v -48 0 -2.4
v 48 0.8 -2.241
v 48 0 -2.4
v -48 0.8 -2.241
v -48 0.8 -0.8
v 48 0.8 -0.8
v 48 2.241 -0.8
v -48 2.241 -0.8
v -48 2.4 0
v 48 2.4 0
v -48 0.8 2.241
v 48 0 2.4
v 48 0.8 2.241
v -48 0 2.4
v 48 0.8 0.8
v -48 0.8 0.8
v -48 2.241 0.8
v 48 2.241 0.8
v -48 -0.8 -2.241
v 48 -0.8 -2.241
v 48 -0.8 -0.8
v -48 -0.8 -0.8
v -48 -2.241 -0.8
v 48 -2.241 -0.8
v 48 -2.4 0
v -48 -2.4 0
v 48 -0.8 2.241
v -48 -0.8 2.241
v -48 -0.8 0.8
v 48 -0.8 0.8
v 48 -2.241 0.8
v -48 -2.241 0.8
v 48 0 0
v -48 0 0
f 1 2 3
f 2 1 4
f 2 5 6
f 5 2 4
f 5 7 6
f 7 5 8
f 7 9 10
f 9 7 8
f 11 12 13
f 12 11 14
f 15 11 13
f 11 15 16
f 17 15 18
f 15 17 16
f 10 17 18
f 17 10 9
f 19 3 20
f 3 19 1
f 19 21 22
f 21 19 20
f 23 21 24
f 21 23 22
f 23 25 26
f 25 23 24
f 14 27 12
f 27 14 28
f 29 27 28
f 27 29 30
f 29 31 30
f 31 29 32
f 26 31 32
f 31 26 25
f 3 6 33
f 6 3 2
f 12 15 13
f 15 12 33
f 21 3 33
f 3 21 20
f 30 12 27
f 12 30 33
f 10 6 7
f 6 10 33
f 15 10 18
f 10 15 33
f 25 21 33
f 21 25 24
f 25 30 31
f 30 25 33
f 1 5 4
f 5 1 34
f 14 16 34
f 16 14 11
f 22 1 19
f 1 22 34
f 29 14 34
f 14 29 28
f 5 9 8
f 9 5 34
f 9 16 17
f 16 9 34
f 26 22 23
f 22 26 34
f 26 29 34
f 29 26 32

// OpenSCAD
// file: ../p/4-4edge.scad
use <../lib.scad>
$fa=1; $fs=0.2;
function ldraw_lib__4_4edge(realsolid=false) = [
// 0 Circle 1.0
// 0 Name: 4-4edge.dat
// 0 Author: James Jessiman
// 0 !LDRAW_ORG Primitive UPDATE 2017-01
// 0 !LICENSE Licensed under CC BY 2.0 and CC BY 4.0 : see CAreadme.txt
// 
// 0 BFC CERTIFY CCW
  [0,"BFC","CERTIFY"],
  [0,"BFC","CCW"],
// 
// 0 !HISTORY 1998-12-15 [PTadmin] Official Update 1998-10
// 0 !HISTORY 2005-12-28 [PTadmin] Official Update 2005-01
// 0 !HISTORY 2007-06-24 [PTadmin] Header formatted for Contributor Agreement
// 0 !HISTORY 2008-07-01 [PTadmin] Official Update 2008-01
// 0 !HISTORY 2017-01-15 [Steffen] BFCed
// 0 !HISTORY 2017-12-30 [PTadmin] Official Update 2017-01
// 
// 
// 2 24 1 0 0 0.9239 0 0.3827
  [2,24,1,0,0,0.9239,0,0.3827],
// 2 24 0.9239 0 0.3827 0.7071 0 0.7071
  [2,24,0.9239,0,0.3827,0.7071,0,0.7071],
// 2 24 0.7071 0 0.7071 0.3827 0 0.9239
  [2,24,0.7071,0,0.7071,0.3827,0,0.9239],
// 2 24 0.3827 0 0.9239 0 0 1
  [2,24,0.3827,0,0.9239,0,0,1],
// 2 24 0 0 1 -0.3827 0 0.9239
  [2,24,0,0,1,-0.3827,0,0.9239],
// 2 24 -0.3827 0 0.9239 -0.7071 0 0.7071
  [2,24,-0.3827,0,0.9239,-0.7071,0,0.7071],
// 2 24 -0.7071 0 0.7071 -0.9239 0 0.3827
  [2,24,-0.7071,0,0.7071,-0.9239,0,0.3827],
// 2 24 -0.9239 0 0.3827 -1 0 -0
  [2,24,-0.9239,0,0.3827,-1,0,-0],
// 2 24 -1 0 -0 -0.9239 0 -0.3827
  [2,24,-1,0,-0,-0.9239,0,-0.3827],
// 2 24 -0.9239 0 -0.3827 -0.7071 0 -0.7071
  [2,24,-0.9239,0,-0.3827,-0.7071,0,-0.7071],
// 2 24 -0.7071 0 -0.7071 -0.3827 0 -0.9239
  [2,24,-0.7071,0,-0.7071,-0.3827,0,-0.9239],
// 2 24 -0.3827 0 -0.9239 0 0 -1
  [2,24,-0.3827,0,-0.9239,0,0,-1],
// 2 24 0 0 -1 0.3827 0 -0.9239
  [2,24,0,0,-1,0.3827,0,-0.9239],
// 2 24 0.3827 0 -0.9239 0.7071 0 -0.7071
  [2,24,0.3827,0,-0.9239,0.7071,0,-0.7071],
// 2 24 0.7071 0 -0.7071 0.9239 0 -0.3827
  [2,24,0.7071,0,-0.7071,0.9239,0,-0.3827],
// 2 24 0.9239 0 -0.3827 1 0 0
  [2,24,0.9239,0,-0.3827,1,0,0],
];
module ldraw_lib__4_4edge(step=0, col=false, unit=2/5, alt=false, line=0.2, solid=!$preview)
    makepoly(ldraw_lib__4_4edge(solid), step=step, col=col, unit=unit, alt=alt, line=line, solid=solid);
ldraw_lib__4_4edge(line=0.2);
// file: ../p/4-4disc.scad
use <../lib.scad>
$fa=1; $fs=0.2;
function ldraw_lib__4_4disc(realsolid=false) = [
// 0 Disc 1.0
// 0 Name: 4-4disc.dat
// 0 Author: James Jessiman
// 0 !LDRAW_ORG Primitive UPDATE 2002-02
// 0 !LICENSE Licensed under CC BY 2.0 and CC BY 4.0 : see CAreadme.txt
// 
// 0 BFC CERTIFY CCW
  [0,"BFC","CERTIFY"],
  [0,"BFC","CCW"],
// 
// 0 !HISTORY 1998-12-15 [PTadmin] Official Update 1998-10
// 0 !HISTORY 2002-03-23 [sbliss] Added BFC statement
// 0 !HISTORY 2002-04-25 [PTadmin] Official Update 2002-02
// 0 !HISTORY 2007-06-24 [PTadmin] Header formatted for Contributor Agreement
// 0 !HISTORY 2008-07-01 [PTadmin] Official Update 2008-01
// 
// 
// 3 16 0 0 0 1 0 0 0.9239 0 0.3827
  [3,16,0,0,0,1,0,0,0.9239,0,0.3827],
// 3 16 0 0 0 0.9239 0 0.3827 0.7071 0 0.7071
  [3,16,0,0,0,0.9239,0,0.3827,0.7071,0,0.7071],
// 3 16 0 0 0 0.7071 0 0.7071 0.3827 0 0.9239
  [3,16,0,0,0,0.7071,0,0.7071,0.3827,0,0.9239],
// 3 16 0 0 0 0.3827 0 0.9239 0 0 1
  [3,16,0,0,0,0.3827,0,0.9239,0,0,1],
// 3 16 0 0 0 0 0 1 -0.3827 0 0.9239
  [3,16,0,0,0,0,0,1,-0.3827,0,0.9239],
// 3 16 0 0 0 -0.3827 0 0.9239 -0.7071 0 0.7071
  [3,16,0,0,0,-0.3827,0,0.9239,-0.7071,0,0.7071],
// 3 16 0 0 0 -0.7071 0 0.7071 -0.9239 0 0.3827
  [3,16,0,0,0,-0.7071,0,0.7071,-0.9239,0,0.3827],
// 3 16 0 0 0 -0.9239 0 0.3827 -1 0 -0
  [3,16,0,0,0,-0.9239,0,0.3827,-1,0,-0],
// 3 16 0 0 0 -1 0 -0 -0.9239 0 -0.3827
  [3,16,0,0,0,-1,0,-0,-0.9239,0,-0.3827],
// 3 16 0 0 0 -0.9239 0 -0.3827 -0.7071 0 -0.7071
  [3,16,0,0,0,-0.9239,0,-0.3827,-0.7071,0,-0.7071],
// 3 16 0 0 0 -0.7071 0 -0.7071 -0.3827 0 -0.9239
  [3,16,0,0,0,-0.7071,0,-0.7071,-0.3827,0,-0.9239],
// 3 16 0 0 0 -0.3827 0 -0.9239 0 0 -1
  [3,16,0,0,0,-0.3827,0,-0.9239,0,0,-1],
// 3 16 0 0 0 0 0 -1 0.3827 0 -0.9239
  [3,16,0,0,0,0,0,-1,0.3827,0,-0.9239],
// 3 16 0 0 0 0.3827 0 -0.9239 0.7071 0 -0.7071
  [3,16,0,0,0,0.3827,0,-0.9239,0.7071,0,-0.7071],
// 3 16 0 0 0 0.7071 0 -0.7071 0.9239 0 -0.3827
  [3,16,0,0,0,0.7071,0,-0.7071,0.9239,0,-0.3827],
// 3 16 0 0 0 0.9239 0 -0.3827 1 0 0
  [3,16,0,0,0,0.9239,0,-0.3827,1,0,0],
// 0
];
module ldraw_lib__4_4disc(step=0, col=false, unit=2/5, alt=false, line=0.2, solid=!$preview)
    makepoly(ldraw_lib__4_4disc(solid), step=step, col=col, unit=unit, alt=alt, line=line, solid=solid);
ldraw_lib__4_4disc(line=0.2);
// file: ../p/4-4cyli.scad
use <../lib.scad>
$fa=1; $fs=0.2;
function ldraw_lib__4_4cyli(realsolid=false) = [
// 0 Cylinder 1.0
// 0 Name: 4-4cyli.dat
// 0 Author: James Jessiman
// 0 !LDRAW_ORG Primitive UPDATE 2005-01
// 0 !LICENSE Licensed under CC BY 2.0 and CC BY 4.0 : see CAreadme.txt
// 
// 0 BFC CERTIFY CCW
  [0,"BFC","CERTIFY"],
  [0,"BFC","CCW"],
// 
// 0 !HISTORY 1998-12-15 [PTadmin] Official Update 1998-10
// 0 !HISTORY 2002-03-23 [sbliss] Added BFC statement; merged headers from files in distributions LDraw 0.27 and Complete.
// 0 !HISTORY 2002-04-25 [PTadmin] Official Update 2002-02
// 0 !HISTORY 2004-12-14 [guyvivan] BFC CCW
// 0 !HISTORY 2005-12-28 [PTadmin] Official Update 2005-01
// 0 !HISTORY 2007-06-24 [PTadmin] Header formatted for Contributor Agreement
// 0 !HISTORY 2008-07-01 [PTadmin] Official Update 2008-01
// 
// 
// 4 16 1 1 0 0.9239 1 0.3827 0.9239 0 0.3827 1 0 0
  [4,16,1,1,0,0.9239,1,0.3827,0.9239,0,0.3827,1,0,0],
// 5 24 1 0 0 1 1 0 0.9239 0 0.3827 0.9239 0 -0.3827
  [5,24,1,0,0,1,1,0,0.9239,0,0.3827,0.9239,0,-0.3827],
// 4 16 0.9239 1 0.3827 0.7071 1 0.7071 0.7071 0 0.7071 0.9239 0 0.3827
  [4,16,0.9239,1,0.3827,0.7071,1,0.7071,0.7071,0,0.7071,0.9239,0,0.3827],
// 5 24 0.9239 0 0.3827 0.9239 1 0.3827 0.7071 0 0.7071 1 0 0
  [5,24,0.9239,0,0.3827,0.9239,1,0.3827,0.7071,0,0.7071,1,0,0],
// 4 16 0.7071 1 0.7071 0.3827 1 0.9239 0.3827 0 0.9239 0.7071 0 0.7071
  [4,16,0.7071,1,0.7071,0.3827,1,0.9239,0.3827,0,0.9239,0.7071,0,0.7071],
// 5 24 0.7071 0 0.7071 0.7071 1 0.7071 0.3827 0 0.9239 0.9239 0 0.3827
  [5,24,0.7071,0,0.7071,0.7071,1,0.7071,0.3827,0,0.9239,0.9239,0,0.3827],
// 4 16 0.3827 1 0.9239 0 1 1 0 0 1 0.3827 0 0.9239
  [4,16,0.3827,1,0.9239,0,1,1,0,0,1,0.3827,0,0.9239],
// 5 24 0.3827 0 0.9239 0.3827 1 0.9239 0 0 1 0.7071 0 0.7071
  [5,24,0.3827,0,0.9239,0.3827,1,0.9239,0,0,1,0.7071,0,0.7071],
// 4 16 0 1 1 -0.3827 1 0.9239 -0.3827 0 0.9239 0 0 1
  [4,16,0,1,1,-0.3827,1,0.9239,-0.3827,0,0.9239,0,0,1],
// 5 24 0 0 1 0 1 1 -0.3827 0 0.9239 0.3827 0 0.9239
  [5,24,0,0,1,0,1,1,-0.3827,0,0.9239,0.3827,0,0.9239],
// 4 16 -0.3827 1 0.9239 -0.7071 1 0.7071 -0.7071 0 0.7071 -0.3827 0 0.9239
  [4,16,-0.3827,1,0.9239,-0.7071,1,0.7071,-0.7071,0,0.7071,-0.3827,0,0.9239],
// 5 24 -0.3827 0 0.9239 -0.3827 1 0.9239 -0.7071 0 0.7071 0 0 1
  [5,24,-0.3827,0,0.9239,-0.3827,1,0.9239,-0.7071,0,0.7071,0,0,1],
// 4 16 -0.7071 1 0.7071 -0.9239 1 0.3827 -0.9239 0 0.3827 -0.7071 0 0.7071
  [4,16,-0.7071,1,0.7071,-0.9239,1,0.3827,-0.9239,0,0.3827,-0.7071,0,0.7071],
// 5 24 -0.7071 0 0.7071 -0.7071 1 0.7071 -0.9239 0 0.3827 -0.3827 0 0.9239
  [5,24,-0.7071,0,0.7071,-0.7071,1,0.7071,-0.9239,0,0.3827,-0.3827,0,0.9239],
// 4 16 -0.9239 1 0.3827 -1 1 0 -1 0 0 -0.9239 0 0.3827
  [4,16,-0.9239,1,0.3827,-1,1,0,-1,0,0,-0.9239,0,0.3827],
// 5 24 -0.9239 0 0.3827 -0.9239 1 0.3827 -1 0 0 -0.7071 0 0.7071
  [5,24,-0.9239,0,0.3827,-0.9239,1,0.3827,-1,0,0,-0.7071,0,0.7071],
// 4 16 -1 1 0 -0.9239 1 -0.3827 -0.9239 0 -0.3827 -1 0 0
  [4,16,-1,1,0,-0.9239,1,-0.3827,-0.9239,0,-0.3827,-1,0,0],
// 5 24 -1 0 0 -1 1 0 -0.9239 0 -0.3827 -0.9239 0 0.3827
  [5,24,-1,0,0,-1,1,0,-0.9239,0,-0.3827,-0.9239,0,0.3827],
// 4 16 -0.9239 1 -0.3827 -0.7071 1 -0.7071 -0.7071 0 -0.7071 -0.9239 0 -0.3827
  [4,16,-0.9239,1,-0.3827,-0.7071,1,-0.7071,-0.7071,0,-0.7071,-0.9239,0,-0.3827],
// 5 24 -0.9239 0 -0.3827 -0.9239 1 -0.3827 -0.7071 0 -0.7071 -1 0 0
  [5,24,-0.9239,0,-0.3827,-0.9239,1,-0.3827,-0.7071,0,-0.7071,-1,0,0],
// 4 16 -0.7071 1 -0.7071 -0.3827 1 -0.9239 -0.3827 0 -0.9239 -0.7071 0 -0.7071
  [4,16,-0.7071,1,-0.7071,-0.3827,1,-0.9239,-0.3827,0,-0.9239,-0.7071,0,-0.7071],
// 5 24 -0.7071 0 -0.7071 -0.7071 1 -0.7071 -0.3827 0 -0.9239 -0.9239 0 -0.3827
  [5,24,-0.7071,0,-0.7071,-0.7071,1,-0.7071,-0.3827,0,-0.9239,-0.9239,0,-0.3827],
// 4 16 -0.3827 1 -0.9239 0 1 -1 0 0 -1 -0.3827 0 -0.9239
  [4,16,-0.3827,1,-0.9239,0,1,-1,0,0,-1,-0.3827,0,-0.9239],
// 5 24 -0.3827 0 -0.9239 -0.3827 1 -0.9239 0 0 -1 -0.7071 0 -0.7071
  [5,24,-0.3827,0,-0.9239,-0.3827,1,-0.9239,0,0,-1,-0.7071,0,-0.7071],
// 4 16 0 1 -1 0.3827 1 -0.9239 0.3827 0 -0.9239 0 0 -1
  [4,16,0,1,-1,0.3827,1,-0.9239,0.3827,0,-0.9239,0,0,-1],
// 5 24 0 0 -1 0 1 -1 0.3827 0 -0.9239 -0.3827 0 -0.9239
  [5,24,0,0,-1,0,1,-1,0.3827,0,-0.9239,-0.3827,0,-0.9239],
// 4 16 0.3827 1 -0.9239 0.7071 1 -0.7071 0.7071 0 -0.7071 0.3827 0 -0.9239
  [4,16,0.3827,1,-0.9239,0.7071,1,-0.7071,0.7071,0,-0.7071,0.3827,0,-0.9239],
// 5 24 0.3827 0 -0.9239 0.3827 1 -0.9239 0.7071 0 -0.7071 0 0 -1
  [5,24,0.3827,0,-0.9239,0.3827,1,-0.9239,0.7071,0,-0.7071,0,0,-1],
// 4 16 0.7071 1 -0.7071 0.9239 1 -0.3827 0.9239 0 -0.3827 0.7071 0 -0.7071
  [4,16,0.7071,1,-0.7071,0.9239,1,-0.3827,0.9239,0,-0.3827,0.7071,0,-0.7071],
// 5 24 0.7071 0 -0.7071 0.7071 1 -0.7071 0.9239 0 -0.3827 0.3827 0 -0.9239
  [5,24,0.7071,0,-0.7071,0.7071,1,-0.7071,0.9239,0,-0.3827,0.3827,0,-0.9239],
// 4 16 0.9239 1 -0.3827 1 1 0 1 0 0 0.9239 0 -0.3827
  [4,16,0.9239,1,-0.3827,1,1,0,1,0,0,0.9239,0,-0.3827],
// 5 24 0.9239 0 -0.3827 0.9239 1 -0.3827 1 0 0 0.7071 0 -0.7071
  [5,24,0.9239,0,-0.3827,0.9239,1,-0.3827,1,0,0,0.7071,0,-0.7071],
// 0
];
module ldraw_lib__4_4cyli(step=0, col=false, unit=2/5, alt=false, line=0.2, solid=!$preview)
    makepoly(ldraw_lib__4_4cyli(solid), step=step, col=col, unit=unit, alt=alt, line=line, solid=solid);
ldraw_lib__4_4cyli(line=0.2);
// file: ../p/stud3.scad
use <../lib.scad>
use <4-4cyli.scad>
use <4-4disc.scad>
use <4-4edge.scad>
$fa=1; $fs=0.2;
function ldraw_lib__stud3(realsolid=false) = realsolid ? 
    [openscad(translate([0,0,-eps()], o=cylinder(4+eps(), r=4)),2)] : [
// 0 Stud Tube Solid
// 0 Name: stud3.dat
// 0 Author: James Jessiman
// 0 !LDRAW_ORG Primitive UPDATE 2012-01
// 0 !LICENSE Licensed under CC BY 2.0 and CC BY 4.0 : see CAreadme.txt
// 
// 0 BFC CERTIFY CCW
  [0,"BFC","CERTIFY"],
  [0,"BFC","CCW"],
// 
// 0 !HISTORY 2002-04-04 [sbliss] Modified for BFC compliance
// 0 !HISTORY 2002-04-25 [PTadmin] Official Update 2002-02
// 0 !HISTORY 2007-06-24 [PTadmin] Header formatted for Contributor Agreement
// 0 !HISTORY 2008-07-01 [PTadmin] Official Update 2008-01
// 0 !HISTORY 2012-02-16 [Philo] Changed to CCW
// 0 !HISTORY 2012-03-30 [PTadmin] Official Update 2012-01
// 
// 
// 1 16 0 -4 0 4 0 0 0 1 0 0 0 4 4-4edge.dat
  [1,16,0,-4,0,4,0,0,0,1,0,0,0,4, ldraw_lib__4_4edge(realsolid)],
// 1 16 0 0 0 4 0 0 0 1 0 0 0 4 4-4edge.dat
  [1,16,0,0,0,4,0,0,0,1,0,0,0,4, ldraw_lib__4_4edge(realsolid)],
// 1 16 0 -4 0 4 0 0 0 1 0 0 0 4 4-4disc.dat
  [1,16,0,-4,0,4,0,0,0,1,0,0,0,4, ldraw_lib__4_4disc(realsolid)],
// 1 16 0 -4 0 4 0 0 0 4 0 0 0 4 4-4cyli.dat
  [1,16,0,-4,0,4,0,0,0,4,0,0,0,4, ldraw_lib__4_4cyli(realsolid)],
];
module ldraw_lib__stud3(step=0, col=false, unit=2/5, alt=false, line=0.2, solid=!$preview)
    makepoly(ldraw_lib__stud3(solid), step=step, col=col, unit=unit, alt=alt, line=line, solid=solid);
ldraw_lib__stud3(line=0.2);
// file: ../p/stud.scad
use <../lib.scad>
use <4-4cyli.scad>
use <4-4disc.scad>
use <4-4edge.scad>
$fa=1; $fs=0.2;
function ldraw_lib__stud(realsolid=false) = realsolid ? 
    [openscad(translate([0,0,-eps()], o=cylinder(4+eps(), r=6)),2)] : [
// 0 Stud
// 0 Name: stud.dat
// 0 Author: James Jessiman
// 0 !LDRAW_ORG Primitive UPDATE 2012-01
// 0 !LICENSE Licensed under CC BY 2.0 and CC BY 4.0 : see CAreadme.txt
// 
// 0 BFC CERTIFY CCW
  [0,"BFC","CERTIFY"],
  [0,"BFC","CCW"],
// 
// 0 !HISTORY 2002-04-04 [sbliss] Modified for BFC compliance
// 0 !HISTORY 2002-04-25 [PTadmin] Official Update 2002-02
// 0 !HISTORY 2007-06-24 [PTadmin] Header formatted for Contributor Agreement
// 0 !HISTORY 2008-07-01 [PTadmin] Official Update 2008-01
// 0 !HISTORY 2012-02-16 [Philo] Changed to CCW
// 0 !HISTORY 2012-03-30 [PTadmin] Official Update 2012-01
// 
// 
// 1 16 0 0 0 6 0 0 0 1 0 0 0 6 4-4edge.dat
  [1,16,0,0,0,6,0,0,0,1,0,0,0,6, ldraw_lib__4_4edge(realsolid)],
// 1 16 0 -4 0 6 0 0 0 1 0 0 0 6 4-4edge.dat
  [1,16,0,-4,0,6,0,0,0,1,0,0,0,6, ldraw_lib__4_4edge(realsolid)],
// 1 16 0 0 0 6 0 0 0 -4 0 0 0 6 4-4cyli.dat
  [1,16,0,0,0,6,0,0,0,-4,0,0,0,6, ldraw_lib__4_4cyli(realsolid)],
// 1 16 0 -4 0 6 0 0 0 1 0 0 0 6 4-4disc.dat
  [1,16,0,-4,0,6,0,0,0,1,0,0,0,6, ldraw_lib__4_4disc(realsolid)],
];
module ldraw_lib__stud(step=0, col=false, unit=2/5, alt=false, line=0.2, solid=!$preview)
    makepoly(ldraw_lib__stud(solid), step=step, col=col, unit=unit, alt=alt, line=line, solid=solid);
ldraw_lib__stud(line=0.2);
// file: ../p/box5.scad
use <../lib.scad>
$fa=1; $fs=0.2;
function ldraw_lib__box5(realsolid=false) = [
// 0 Box with 5 Faces and All Edges
// 0 Name: box5.dat
// 0 Author: James Jessiman
// 0 !LDRAW_ORG Primitive UPDATE 2012-01
// 0 !LICENSE Licensed under CC BY 2.0 and CC BY 4.0 : see CAreadme.txt
// 
// 0 BFC CERTIFY CCW
  [0,"BFC","CERTIFY"],
  [0,"BFC","CCW"],
// 
// 0 !HISTORY 2002-04-03 [sbliss] Modified for BFC compliance
// 0 !HISTORY 2002-04-25 [PTadmin] Official Update 2002-02
// 0 !HISTORY 2007-06-24 [PTadmin] Header formatted for Contributor Agreement
// 0 !HISTORY 2008-07-01 [PTadmin] Official Update 2008-01
// 0 !HISTORY 2012-02-16 [Philo] Changed to CCW
// 0 !HISTORY 2012-03-30 [PTadmin] Official Update 2012-01
// 
// 
// 2 24 1 1 1 -1 1 1
  [2,24,1,1,1,-1,1,1],
// 2 24 -1 1 1 -1 1 -1
  [2,24,-1,1,1,-1,1,-1],
// 2 24 -1 1 -1 1 1 -1
  [2,24,-1,1,-1,1,1,-1],
// 2 24 1 1 -1 1 1 1
  [2,24,1,1,-1,1,1,1],
// 2 24 1 0 1 -1 0 1
  [2,24,1,0,1,-1,0,1],
// 2 24 -1 0 1 -1 0 -1
  [2,24,-1,0,1,-1,0,-1],
// 2 24 -1 0 -1 1 0 -1
  [2,24,-1,0,-1,1,0,-1],
// 2 24 1 0 -1 1 0 1
  [2,24,1,0,-1,1,0,1],
// 2 24 1 0 1 1 1 1
  [2,24,1,0,1,1,1,1],
// 2 24 -1 0 1 -1 1 1
  [2,24,-1,0,1,-1,1,1],
// 2 24 1 0 -1 1 1 -1
  [2,24,1,0,-1,1,1,-1],
// 2 24 -1 0 -1 -1 1 -1
  [2,24,-1,0,-1,-1,1,-1],
// 4 16 -1 1 1 1 1 1 1 1 -1 -1 1 -1
  [4,16,-1,1,1,1,1,1,1,1,-1,-1,1,-1],
// 4 16 -1 1 1 -1 0 1 1 0 1 1 1 1
  [4,16,-1,1,1,-1,0,1,1,0,1,1,1,1],
// 4 16 -1 1 -1 -1 0 -1 -1 0 1 -1 1 1
  [4,16,-1,1,-1,-1,0,-1,-1,0,1,-1,1,1],
// 4 16 1 1 -1 1 0 -1 -1 0 -1 -1 1 -1
  [4,16,1,1,-1,1,0,-1,-1,0,-1,-1,1,-1],
// 4 16 1 1 1 1 0 1 1 0 -1 1 1 -1
  [4,16,1,1,1,1,0,1,1,0,-1,1,1,-1],
];
module ldraw_lib__box5(step=0, col=false, unit=2/5, alt=false, line=0.2, solid=!$preview)
    makepoly(ldraw_lib__box5(solid), step=step, col=col, unit=unit, alt=alt, line=line, solid=solid);
ldraw_lib__box5(line=0.2);
// file: ../p/box4t.scad
use <../lib.scad>
$fa=1; $fs=0.2;
function ldraw_lib__box4t(realsolid=false) = [
// 0 Box with 4 Adjacent Faces and All Edges
// 0 Name: box4t.dat
// 0 Author: Tore Eriksson [Tore_Eriksson]
// 0 !LDRAW_ORG Primitive UPDATE 2003-02
// 0 !LICENSE Licensed under CC BY 2.0 and CC BY 4.0 : see CAreadme.txt
// 
// 0 BFC CERTIFY CCW
  [0,"BFC","CERTIFY"],
  [0,"BFC","CCW"],
// 
// 0 !HISTORY 1997-09-29 [PTadmin] Official Update 1997-15
// 0 !HISTORY 2002-08-31 [izanette] Modified with WINDZ for BFC compliance
// 0 !HISTORY 2003-08-01 [PTadmin] Official Update 2003-02
// 0 !HISTORY 2007-06-24 [PTadmin] Header formatted for Contributor Agreement
// 0 !HISTORY 2008-07-01 [PTadmin] Official Update 2008-01
// 
// 
// 2 24 1 1 1 -1 1 1
  [2,24,1,1,1,-1,1,1],
// 2 24 -1 1 1 -1 1 -1
  [2,24,-1,1,1,-1,1,-1],
// 2 24 -1 1 -1 1 1 -1
  [2,24,-1,1,-1,1,1,-1],
// 2 24 1 1 -1 1 1 1
  [2,24,1,1,-1,1,1,1],
// 2 24 1 0 1 -1 0 1
  [2,24,1,0,1,-1,0,1],
// 2 24 -1 0 1 -1 0 -1
  [2,24,-1,0,1,-1,0,-1],
// 2 24 -1 0 -1 1 0 -1
  [2,24,-1,0,-1,1,0,-1],
// 2 24 1 0 -1 1 0 1
  [2,24,1,0,-1,1,0,1],
// 2 24 1 0 1 1 1 1
  [2,24,1,0,1,1,1,1],
// 2 24 -1 0 1 -1 1 1
  [2,24,-1,0,1,-1,1,1],
// 2 24 1 0 -1 1 1 -1
  [2,24,1,0,-1,1,1,-1],
// 2 24 -1 0 -1 -1 1 -1
  [2,24,-1,0,-1,-1,1,-1],
// 4 16 1 1 1 1 1 -1 -1 1 -1 -1 1 1
  [4,16,1,1,1,1,1,-1,-1,1,-1,-1,1,1],
// 4 16 1 1 1 -1 1 1 -1 0 1 1 0 1
  [4,16,1,1,1,-1,1,1,-1,0,1,1,0,1],
// 4 16 -1 1 1 -1 1 -1 -1 0 -1 -1 0 1
  [4,16,-1,1,1,-1,1,-1,-1,0,-1,-1,0,1],
// 0 4 16 -1 1 -1 -1 0 -1 1 0 -1 1 1 -1
// 4 16 1 1 -1 1 1 1 1 0 1 1 0 -1
  [4,16,1,1,-1,1,1,1,1,0,1,1,0,-1],
// 0
];
module ldraw_lib__box4t(step=0, col=false, unit=2/5, alt=false, line=0.2, solid=!$preview)
    makepoly(ldraw_lib__box4t(solid), step=step, col=col, unit=unit, alt=alt, line=line, solid=solid);
ldraw_lib__box4t(line=0.2);
// file: s/3004s01.scad
use <../../lib.scad>
use <../../p/box4t.scad>
use <../../p/box5.scad>
use <../../p/stud.scad>
use <../../p/stud3.scad>
$fa=1; $fs=0.2;
function ldraw_lib__s__3004s01(realsolid=false) = [
// 0 ~Brick  1 x  2 without Front Face
// 0 Name: s\3004s01.dat
// 0 Author: James Jessiman
// 0 !LDRAW_ORG Subpart UPDATE 2003-03
// 0 !LICENSE Licensed under CC BY 2.0 and CC BY 4.0 : see CAreadme.txt
// 
// 0 BFC CERTIFY CCW
  [0,"BFC","CERTIFY"],
  [0,"BFC","CCW"],
// 
// 0 !HISTORY 2003-09-07 [jriley] Subfiling, BFC
// 0 !HISTORY 2003-12-19 [PTadmin] Official Update 2003-03
// 0 !HISTORY 2007-08-29 [PTadmin] Header formatted for Contributor Agreement
// 0 !HISTORY 2008-07-01 [PTadmin] Official Update 2008-01
// 
// 
// 1 16 0 4 0 1 0 0 0 -5 0 0 0 1 stud3.dat
  [1,16,0,4,0,1,0,0,0,-5,0,0,0,1, ldraw_lib__stud3(realsolid)],
// 0 BFC INVERTNEXT
  [0,"BFC","INVERTNEXT"],
// 1 16 0 24 0 16 0 0 0 -20 0 0 0 6 box5.dat
  [1,16,0,24,0,16,0,0,0,-20,0,0,0,6, ldraw_lib__box5(realsolid)],
// 4 16 20 24 10 16 24 6 -16 24 6 -20 24 10
  [4,16,20,24,10,16,24,6,-16,24,6,-20,24,10],
// 4 16 -20 24 10 -16 24 6 -16 24 -6 -20 24 -10
  [4,16,-20,24,10,-16,24,6,-16,24,-6,-20,24,-10],
// 4 16 -20 24 -10 -16 24 -6 16 24 -6 20 24 -10
  [4,16,-20,24,-10,-16,24,-6,16,24,-6,20,24,-10],
// 4 16 20 24 -10 16 24 -6 16 24 6 20 24 10
  [4,16,20,24,-10,16,24,-6,16,24,6,20,24,10],
// 1 16 0 24 0 20 0 0 0 -24 0 0 0 10 box4t.dat
  [1,16,0,24,0,20,0,0,0,-24,0,0,0,10, ldraw_lib__box4t(realsolid)],
// 1 16 10 0 0 1 0 0 0 1 0 0 0 1 stud.dat
  [1,16,10,0,0,1,0,0,0,1,0,0,0,1, ldraw_lib__stud(realsolid)],
// 1 16 -10 0 0 1 0 0 0 1 0 0 0 1 stud.dat
  [1,16,-10,0,0,1,0,0,0,1,0,0,0,1, ldraw_lib__stud(realsolid)],
// 0
];
module ldraw_lib__s__3004s01(step=0, col=false, unit=2/5, alt=false, line=0.2, solid=!$preview)
    makepoly(ldraw_lib__s__3004s01(solid), step=step, col=col, unit=unit, alt=alt, line=line, solid=solid);
ldraw_lib__s__3004s01(line=0.2);
// file: ../p/axle.scad
use <../lib.scad>
$fa=1; $fs=0.2;
function ldraw_lib__axle(realsolid=false) = [
// 0 Axle
// 0 Name: axle.dat
// 0 Author: James Jessiman
// 0 !LDRAW_ORG Primitive UPDATE 2003-01
// 0 !LICENSE Licensed under CC BY 2.0 and CC BY 4.0 : see CAreadme.txt
// 
// 0 BFC CERTIFY CCW
  [0,"BFC","CERTIFY"],
  [0,"BFC","CCW"],
// 
// 0 !HISTORY 2000-04-23 [sbliss] Added conditional edges along outermost diameters
// 0 !HISTORY 2000-05-07 [PTadmin] Official Update 2000-01
// 0 !HISTORY 2002-11-08 [OrionP] Adjusted fit and precision
// 0 !HISTORY 2003-03-12 [PTadmin] Official Update 2003-01
// 0 !HISTORY 2007-06-24 [PTadmin] Header formatted for Contributor Agreement
// 0 !HISTORY 2008-07-01 [PTadmin] Official Update 2008-01
// 
// 
// 5 24 6 0 0 6 1 0 5.602 0 2 5.602 0 -2
  [5,24,6,0,0,6,1,0,5.602,0,2,5.602,0,-2],
// 5 24 0 0 6 0 1 6 2 0 5.602 -2 0 5.602
  [5,24,0,0,6,0,1,6,2,0,5.602,-2,0,5.602],
// 5 24 -6 0 0 -6 1 0 -5.602 0 -2 -5.602 0 2
  [5,24,-6,0,0,-6,1,0,-5.602,0,-2,-5.602,0,2],
// 5 24 0 0 -6 0 1 -6 -2 0 -5.602 2 0 -5.602
  [5,24,0,0,-6,0,1,-6,-2,0,-5.602,2,0,-5.602],
// 
// 2 24 6 0 0 5.602 0 2
  [2,24,6,0,0,5.602,0,2],
// 2 24 5.602 0 2 2 0 2
  [2,24,5.602,0,2,2,0,2],
// 2 24 2 0 2 2 0 5.602
  [2,24,2,0,2,2,0,5.602],
// 2 24 2 0 5.602 0 0 6
  [2,24,2,0,5.602,0,0,6],
// 2 24 -6 0 0 -5.602 0 2
  [2,24,-6,0,0,-5.602,0,2],
// 2 24 -5.602 0 2 -2 0 2
  [2,24,-5.602,0,2,-2,0,2],
// 2 24 -2 0 2 -2 0 5.602
  [2,24,-2,0,2,-2,0,5.602],
// 2 24 -2 0 5.602 -0 0 6
  [2,24,-2,0,5.602,-0,0,6],
// 2 24 6 0 -0 5.602 0 -2
  [2,24,6,0,-0,5.602,0,-2],
// 2 24 5.602 0 -2 2 0 -2
  [2,24,5.602,0,-2,2,0,-2],
// 2 24 2 0 -2 2 0 -5.602
  [2,24,2,0,-2,2,0,-5.602],
// 2 24 2 0 -5.602 0 0 -6
  [2,24,2,0,-5.602,0,0,-6],
// 2 24 -6 0 -0 -5.602 0 -2
  [2,24,-6,0,-0,-5.602,0,-2],
// 2 24 -5.602 0 -2 -2 0 -2
  [2,24,-5.602,0,-2,-2,0,-2],
// 2 24 -2 0 -2 -2 0 -5.602
  [2,24,-2,0,-2,-2,0,-5.602],
// 2 24 -2 0 -5.602 -0 0 -6
  [2,24,-2,0,-5.602,-0,0,-6],
// 2 24 6 1 0 5.602 1 2
  [2,24,6,1,0,5.602,1,2],
// 2 24 5.602 1 2 2 1 2
  [2,24,5.602,1,2,2,1,2],
// 2 24 2 1 2 2 1 5.602
  [2,24,2,1,2,2,1,5.602],
// 2 24 2 1 5.602 0 1 6
  [2,24,2,1,5.602,0,1,6],
// 2 24 -6 1 0 -5.602 1 2
  [2,24,-6,1,0,-5.602,1,2],
// 2 24 -5.602 1 2 -2 1 2
  [2,24,-5.602,1,2,-2,1,2],
// 2 24 -2 1 2 -2 1 5.602
  [2,24,-2,1,2,-2,1,5.602],
// 2 24 -2 1 5.602 -0 1 6
  [2,24,-2,1,5.602,-0,1,6],
// 2 24 6 1 -0 5.602 1 -2
  [2,24,6,1,-0,5.602,1,-2],
// 2 24 5.602 1 -2 2 1 -2
  [2,24,5.602,1,-2,2,1,-2],
// 2 24 2 1 -2 2 1 -5.602
  [2,24,2,1,-2,2,1,-5.602],
// 2 24 2 1 -5.602 0 1 -6
  [2,24,2,1,-5.602,0,1,-6],
// 2 24 -6 1 -0 -5.602 1 -2
  [2,24,-6,1,-0,-5.602,1,-2],
// 2 24 -5.602 1 -2 -2 1 -2
  [2,24,-5.602,1,-2,-2,1,-2],
// 2 24 -2 1 -2 -2 1 -5.602
  [2,24,-2,1,-2,-2,1,-5.602],
// 2 24 -2 1 -5.602 -0 1 -6
  [2,24,-2,1,-5.602,-0,1,-6],
// 
// 2 24 5.602 0 2 5.602 1 2
  [2,24,5.602,0,2,5.602,1,2],
// 2 24 2 0 2 2 1 2
  [2,24,2,0,2,2,1,2],
// 2 24 2 0 5.602 2 1 5.602
  [2,24,2,0,5.602,2,1,5.602],
// 2 24 -5.602 0 2 -5.602 1 2
  [2,24,-5.602,0,2,-5.602,1,2],
// 2 24 -2 0 2 -2 1 2
  [2,24,-2,0,2,-2,1,2],
// 2 24 -2 0 5.602 -2 1 5.602
  [2,24,-2,0,5.602,-2,1,5.602],
// 2 24 5.602 0 -2 5.602 1 -2
  [2,24,5.602,0,-2,5.602,1,-2],
// 2 24 2 0 -2 2 1 -2
  [2,24,2,0,-2,2,1,-2],
// 2 24 2 0 -5.602 2 1 -5.602
  [2,24,2,0,-5.602,2,1,-5.602],
// 2 24 -5.602 0 -2 -5.602 1 -2
  [2,24,-5.602,0,-2,-5.602,1,-2],
// 2 24 -2 0 -2 -2 1 -2
  [2,24,-2,0,-2,-2,1,-2],
// 2 24 -2 0 -5.602 -2 1 -5.602
  [2,24,-2,0,-5.602,-2,1,-5.602],
// 
// 4 16 6 0 0 6 1 0 5.602 1 2 5.602 0 2
  [4,16,6,0,0,6,1,0,5.602,1,2,5.602,0,2],
// 4 16 5.602 0 2 5.602 1 2 2 1 2 2 0 2
  [4,16,5.602,0,2,5.602,1,2,2,1,2,2,0,2],
// 4 16 2 0 2 2 1 2 2 1 5.602 2 0 5.602
  [4,16,2,0,2,2,1,2,2,1,5.602,2,0,5.602],
// 4 16 2 0 5.602 2 1 5.602 0 1 6 0 0 6
  [4,16,2,0,5.602,2,1,5.602,0,1,6,0,0,6],
// 4 16 -6 0 0 -5.602 0 2 -5.602 1 2 -6 1 0
  [4,16,-6,0,0,-5.602,0,2,-5.602,1,2,-6,1,0],
// 4 16 -5.602 0 2 -2 0 2 -2 1 2 -5.602 1 2
  [4,16,-5.602,0,2,-2,0,2,-2,1,2,-5.602,1,2],
// 4 16 -2 0 2 -2 0 5.602 -2 1 5.602 -2 1 2
  [4,16,-2,0,2,-2,0,5.602,-2,1,5.602,-2,1,2],
// 4 16 -2 0 5.602 -0 0 6 -0 1 6 -2 1 5.602
  [4,16,-2,0,5.602,-0,0,6,-0,1,6,-2,1,5.602],
// 4 16 6 0 -0 5.602 0 -2 5.602 1 -2 6 1 -0
  [4,16,6,0,-0,5.602,0,-2,5.602,1,-2,6,1,-0],
// 4 16 5.602 0 -2 2 0 -2 2 1 -2 5.602 1 -2
  [4,16,5.602,0,-2,2,0,-2,2,1,-2,5.602,1,-2],
// 4 16 2 0 -2 2 0 -5.602 2 1 -5.602 2 1 -2
  [4,16,2,0,-2,2,0,-5.602,2,1,-5.602,2,1,-2],
// 4 16 2 0 -5.602 0 0 -6 0 1 -6 2 1 -5.602
  [4,16,2,0,-5.602,0,0,-6,0,1,-6,2,1,-5.602],
// 4 16 -6 0 -0 -6 1 -0 -5.602 1 -2 -5.602 0 -2
  [4,16,-6,0,-0,-6,1,-0,-5.602,1,-2,-5.602,0,-2],
// 4 16 -5.602 0 -2 -5.602 1 -2 -2 1 -2 -2 0 -2
  [4,16,-5.602,0,-2,-5.602,1,-2,-2,1,-2,-2,0,-2],
// 4 16 -2 0 -2 -2 1 -2 -2 1 -5.602 -2 0 -5.602
  [4,16,-2,0,-2,-2,1,-2,-2,1,-5.602,-2,0,-5.602],
// 4 16 -2 0 -5.602 -2 1 -5.602 -0 1 -6 -0 0 -6
  [4,16,-2,0,-5.602,-2,1,-5.602,-0,1,-6,-0,0,-6],
// 
// 4 16 6 0 0 5.602 0 2 2 0 2 0 0 0
  [4,16,6,0,0,5.602,0,2,2,0,2,0,0,0],
// 4 16 -6 0 0 0 0 0 -2 0 2 -5.602 0 2
  [4,16,-6,0,0,0,0,0,-2,0,2,-5.602,0,2],
// 4 16 6 0 0 0 0 0 2 0 -2 5.602 0 -2
  [4,16,6,0,0,0,0,0,2,0,-2,5.602,0,-2],
// 4 16 -6 0 0 -5.602 0 -2 -2 0 -2 0 0 0
  [4,16,-6,0,0,-5.602,0,-2,-2,0,-2,0,0,0],
// 4 16 0 0 6 0 0 0 2 0 2 2 0 5.602
  [4,16,0,0,6,0,0,0,2,0,2,2,0,5.602],
// 4 16 0 0 6 -2 0 5.602 -2 0 2 0 0 0
  [4,16,0,0,6,-2,0,5.602,-2,0,2,0,0,0],
// 4 16 0 0 -6 2 0 -5.602 2 0 -2 0 0 0
  [4,16,0,0,-6,2,0,-5.602,2,0,-2,0,0,0],
// 4 16 0 0 -6 0 0 0 -2 0 -2 -2 0 -5.602
  [4,16,0,0,-6,0,0,0,-2,0,-2,-2,0,-5.602],
// 4 16 6 1 0 0 1 0 2 1 2 5.602 1 2
  [4,16,6,1,0,0,1,0,2,1,2,5.602,1,2],
// 4 16 -6 1 0 -5.602 1 2 -2 1 2 0 1 0
  [4,16,-6,1,0,-5.602,1,2,-2,1,2,0,1,0],
// 4 16 6 1 0 5.602 1 -2 2 1 -2 0 1 0
  [4,16,6,1,0,5.602,1,-2,2,1,-2,0,1,0],
// 4 16 -6 1 0 0 1 0 -2 1 -2 -5.602 1 -2
  [4,16,-6,1,0,0,1,0,-2,1,-2,-5.602,1,-2],
// 4 16 0 1 6 2 1 5.602 2 1 2 0 1 0
  [4,16,0,1,6,2,1,5.602,2,1,2,0,1,0],
// 4 16 0 1 6 0 1 0 -2 1 2 -2 1 5.602
  [4,16,0,1,6,0,1,0,-2,1,2,-2,1,5.602],
// 4 16 0 1 -6 0 1 0 2 1 -2 2 1 -5.602
  [4,16,0,1,-6,0,1,0,2,1,-2,2,1,-5.602],
// 4 16 0 1 -6 -2 1 -5.602 -2 1 -2 0 1 0
  [4,16,0,1,-6,-2,1,-5.602,-2,1,-2,0,1,0],
// 0
];
module ldraw_lib__axle(step=0, col=false, unit=2/5, alt=false, line=0.2, solid=!$preview)
    makepoly(ldraw_lib__axle(solid), step=step, col=col, unit=unit, alt=alt, line=line, solid=solid);
ldraw_lib__axle(line=0.2);
// file: 3004.scad
use <../lib.scad>
use <s/3004s01.scad>
$fa=1; $fs=0.2;
function ldraw_lib__3004(realsolid=false) = [
// 0 Brick  1 x  2
// 0 Name: 3004.dat
// 0 Author: James Jessiman
// 0 !LDRAW_ORG Part UPDATE 2022-05
// 0 !LICENSE Licensed under CC BY 2.0 and CC BY 4.0 : see CAreadme.txt
// 
// 0 BFC CERTIFY CCW
  [0,"BFC","CERTIFY"],
  [0,"BFC","CCW"],
// 
// 0 !HISTORY 2001-10-26 [PTadmin] Official Update 2001-01
// 0 !HISTORY 2002-05-07 {unknown} BFC Certification
// 0 !HISTORY 2002-06-11 [PTadmin] Official Update 2002-03
// 0 !HISTORY 2007-05-07 [PTadmin] Header formatted for Contributor Agreement
// 0 !HISTORY 2008-07-01 [PTadmin] Official Update 2008-01
// 0 !HISTORY 2022-08-04 [MagFors] Using subfile
// 0 !HISTORY 2022-09-15 [PTadmin] Official Update 2022-05
// 
// 
// 1 16 0 0 0 1 0 0 0 1 0 0 0 1 s\3004s01.dat
  [1,16,0,0,0,1,0,0,0,1,0,0,0,1, ldraw_lib__s__3004s01(realsolid)],
// 4 16 -20 24 -10 20 24 -10 20 0 -10 -20 0 -10
  [4,16,-20,24,-10,20,24,-10,20,0,-10,-20,0,-10],
];
module ldraw_lib__3004(step=0, col=false, unit=2/5, alt=false, line=0.2, solid=!$preview)
    makepoly(ldraw_lib__3004(solid), step=step, col=col, unit=unit, alt=alt, line=line, solid=solid);
ldraw_lib__3004(line=0.2);
// file: 3708.scad
use <../lib.scad>
use <../p/axle.scad>
$fa=1; $fs=0.2;
function ldraw_lib__3708(realsolid=false) = [
// 0 Technic Axle 12
// 0 Name: 3708.dat
// 0 Author: James Jessiman
// 0 !LDRAW_ORG Part UPDATE 2005-01
// 0 !LICENSE Licensed under CC BY 2.0 and CC BY 4.0 : see CAreadme.txt
// 
// 0 BFC CERTIFY CCW
  [0,"BFC","CERTIFY"],
  [0,"BFC","CCW"],
// 
// 0 !HISTORY 2004-07-11 [guyvivan] BFC'ed
// 0 !HISTORY 2005-12-28 [PTadmin] Official Update 2005-01
// 0 !HISTORY 2007-06-29 [PTadmin] Header formatted for Contributor Agreement
// 0 !HISTORY 2008-07-01 [PTadmin] Official Update 2008-01
// 
// 
// 1 16 120 0 0 0 -240 0 1 0 0 0 0 1 axle.dat
  [1,16,120,0,0,0,-240,0,1,0,0,0,0,1, ldraw_lib__axle(realsolid)],
// 0
// 
];
module ldraw_lib__3708(step=0, col=false, unit=2/5, alt=false, line=0.2, solid=!$preview)
    makepoly(ldraw_lib__3708(solid), step=step, col=col, unit=unit, alt=alt, line=line, solid=solid);
ldraw_lib__3708(line=0.2);
// main file
use <../lib.scad>
use <3708.scad>
$fa=1; $fs=0.2;
function ldraw_lib__370826(realsolid=false) = [
// 0 ~_Technic Axle 12 Black (Obsolete)
// 0 Name: 370826.dat
// 0 Author: Michael Heidemann [mikeheide]
// 0 !LDRAW_ORG Part Physical_Colour UPDATE 2019-02
// 0 !LICENSE Licensed under CC BY 2.0 and CC BY 4.0 : see CAreadme.txt
// 
// 0 BFC CERTIFY CCW
  [0,"BFC","CERTIFY"],
  [0,"BFC","CCW"],
// 
// 0 !HISTORY 2010-12-31 [PTadmin] Official Update 2010-03
// 0 !HISTORY 2019-07-23 [Holly-Wood] Obsoleted per decision not to include physical colour parts
// 0 !HISTORY 2019-09-09 [PTadmin] Official Update 2019-02
// 
// 
// 1 0 0 0 0 1 0 0 0 1 0 0 0 1 3708.dat
  [1,0,0,0,0,1,0,0,0,1,0,0,0,1, ldraw_lib__3708(realsolid)],
];
module ldraw_lib__370826(step=0, col=false, unit=2/5, alt=false, line=0.2, solid=!$preview)
    makepoly(ldraw_lib__370826(solid), step=step, col=col, unit=unit, alt=alt, line=line, solid=solid);
ldraw_lib__370826(line=0.2);
